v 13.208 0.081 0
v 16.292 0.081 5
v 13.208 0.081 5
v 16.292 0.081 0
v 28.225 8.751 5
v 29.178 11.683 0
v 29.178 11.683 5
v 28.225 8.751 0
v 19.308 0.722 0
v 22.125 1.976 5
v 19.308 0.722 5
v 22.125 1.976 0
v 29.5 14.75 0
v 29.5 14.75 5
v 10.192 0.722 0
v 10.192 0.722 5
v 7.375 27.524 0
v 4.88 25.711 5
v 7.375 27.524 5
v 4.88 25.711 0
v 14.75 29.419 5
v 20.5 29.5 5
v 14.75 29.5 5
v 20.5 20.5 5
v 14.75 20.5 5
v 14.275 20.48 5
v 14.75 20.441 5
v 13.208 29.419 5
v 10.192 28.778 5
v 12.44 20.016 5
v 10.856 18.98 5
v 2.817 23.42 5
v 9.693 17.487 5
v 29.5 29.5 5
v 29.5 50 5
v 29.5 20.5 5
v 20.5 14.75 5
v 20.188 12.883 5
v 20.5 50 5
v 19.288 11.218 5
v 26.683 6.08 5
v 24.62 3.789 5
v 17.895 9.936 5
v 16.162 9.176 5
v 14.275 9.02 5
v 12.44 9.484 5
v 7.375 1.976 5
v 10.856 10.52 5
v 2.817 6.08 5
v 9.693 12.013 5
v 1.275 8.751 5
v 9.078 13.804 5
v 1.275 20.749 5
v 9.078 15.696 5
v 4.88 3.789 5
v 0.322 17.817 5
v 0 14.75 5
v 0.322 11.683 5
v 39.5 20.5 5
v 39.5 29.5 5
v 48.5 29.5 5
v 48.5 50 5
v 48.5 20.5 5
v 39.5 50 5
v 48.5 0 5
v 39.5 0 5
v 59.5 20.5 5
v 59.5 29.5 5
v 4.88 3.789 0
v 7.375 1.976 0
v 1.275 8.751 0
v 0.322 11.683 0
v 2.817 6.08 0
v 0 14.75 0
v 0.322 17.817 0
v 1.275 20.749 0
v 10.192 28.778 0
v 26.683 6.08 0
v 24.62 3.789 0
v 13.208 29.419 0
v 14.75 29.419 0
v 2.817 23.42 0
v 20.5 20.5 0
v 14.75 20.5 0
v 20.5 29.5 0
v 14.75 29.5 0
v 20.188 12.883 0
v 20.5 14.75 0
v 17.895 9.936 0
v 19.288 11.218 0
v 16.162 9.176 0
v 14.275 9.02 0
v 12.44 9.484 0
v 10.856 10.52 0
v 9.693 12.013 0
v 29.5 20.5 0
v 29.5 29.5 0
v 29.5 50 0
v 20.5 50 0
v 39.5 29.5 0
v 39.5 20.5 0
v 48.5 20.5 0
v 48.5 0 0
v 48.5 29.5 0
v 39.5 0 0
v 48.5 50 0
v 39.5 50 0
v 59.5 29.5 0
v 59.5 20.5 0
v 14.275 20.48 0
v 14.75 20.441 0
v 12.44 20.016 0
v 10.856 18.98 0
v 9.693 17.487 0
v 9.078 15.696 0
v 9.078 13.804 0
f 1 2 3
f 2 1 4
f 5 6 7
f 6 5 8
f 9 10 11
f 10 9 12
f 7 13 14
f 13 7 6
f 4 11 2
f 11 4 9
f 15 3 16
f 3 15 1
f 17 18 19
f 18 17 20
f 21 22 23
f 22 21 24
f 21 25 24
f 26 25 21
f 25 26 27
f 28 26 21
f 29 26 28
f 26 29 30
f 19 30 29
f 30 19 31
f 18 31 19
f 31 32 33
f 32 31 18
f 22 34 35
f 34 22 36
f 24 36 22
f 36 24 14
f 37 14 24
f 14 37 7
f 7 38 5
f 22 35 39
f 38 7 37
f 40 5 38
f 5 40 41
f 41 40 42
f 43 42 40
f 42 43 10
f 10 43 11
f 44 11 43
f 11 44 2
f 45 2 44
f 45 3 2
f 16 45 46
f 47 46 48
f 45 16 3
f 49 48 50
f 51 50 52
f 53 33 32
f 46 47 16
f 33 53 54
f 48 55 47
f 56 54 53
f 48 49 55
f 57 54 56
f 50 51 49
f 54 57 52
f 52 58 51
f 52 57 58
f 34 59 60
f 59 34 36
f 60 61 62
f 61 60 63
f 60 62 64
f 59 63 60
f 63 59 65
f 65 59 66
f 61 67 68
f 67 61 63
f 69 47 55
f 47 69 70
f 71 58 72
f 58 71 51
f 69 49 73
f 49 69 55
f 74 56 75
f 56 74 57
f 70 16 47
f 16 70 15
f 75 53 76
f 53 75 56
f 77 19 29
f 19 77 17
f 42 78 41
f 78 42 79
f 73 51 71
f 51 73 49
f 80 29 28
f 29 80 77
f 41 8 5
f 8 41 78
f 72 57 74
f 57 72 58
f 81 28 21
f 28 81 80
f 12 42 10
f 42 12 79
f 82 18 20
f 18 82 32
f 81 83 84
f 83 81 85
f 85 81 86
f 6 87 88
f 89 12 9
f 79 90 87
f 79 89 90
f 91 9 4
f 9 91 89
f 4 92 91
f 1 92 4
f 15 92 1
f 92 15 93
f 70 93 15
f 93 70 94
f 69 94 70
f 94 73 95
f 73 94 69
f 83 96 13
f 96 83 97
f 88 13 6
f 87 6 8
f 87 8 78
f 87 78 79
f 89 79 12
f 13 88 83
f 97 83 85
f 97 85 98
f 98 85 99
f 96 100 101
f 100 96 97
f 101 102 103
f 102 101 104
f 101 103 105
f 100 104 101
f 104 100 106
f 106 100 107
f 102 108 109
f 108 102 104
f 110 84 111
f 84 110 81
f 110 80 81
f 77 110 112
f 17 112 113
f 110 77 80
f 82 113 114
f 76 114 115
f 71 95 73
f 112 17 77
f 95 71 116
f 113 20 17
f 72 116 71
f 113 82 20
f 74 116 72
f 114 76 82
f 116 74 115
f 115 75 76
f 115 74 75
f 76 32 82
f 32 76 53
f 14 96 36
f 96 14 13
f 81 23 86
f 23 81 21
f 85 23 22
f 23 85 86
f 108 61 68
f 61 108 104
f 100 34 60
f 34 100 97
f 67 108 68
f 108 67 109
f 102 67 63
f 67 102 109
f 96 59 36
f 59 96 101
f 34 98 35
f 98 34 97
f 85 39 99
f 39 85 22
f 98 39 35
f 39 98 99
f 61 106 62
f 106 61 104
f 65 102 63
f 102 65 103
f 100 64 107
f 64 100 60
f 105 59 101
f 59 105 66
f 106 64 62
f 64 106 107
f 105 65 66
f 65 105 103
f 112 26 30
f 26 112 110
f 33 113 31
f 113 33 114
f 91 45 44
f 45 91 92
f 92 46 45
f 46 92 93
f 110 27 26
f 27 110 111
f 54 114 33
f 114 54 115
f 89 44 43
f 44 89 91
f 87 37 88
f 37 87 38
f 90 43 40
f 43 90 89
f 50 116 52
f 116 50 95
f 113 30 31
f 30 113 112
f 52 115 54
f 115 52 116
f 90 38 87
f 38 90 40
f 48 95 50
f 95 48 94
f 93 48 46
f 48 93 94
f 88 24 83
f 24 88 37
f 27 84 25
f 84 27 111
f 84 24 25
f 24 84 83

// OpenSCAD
// JH logo

thickness = 5;
size = 50;  // total height

module logo_base(thickness, size, radius, line_thickness)
{
	arrow_pos = 0.6;

	//line_thickness = size * 0.15;
	hor_line_thickness = line_thickness;
	//radius = size * 0.25 + line_thickness / 2 / 2;
	
	translate([radius, radius, 0])
	cylinder(r=radius, h=thickness);

	translate([radius, radius, 0])
	cube([radius, radius, thickness]);

	// Horizontal line
	translate([2*radius - 1, 2*radius - line_thickness, 0])
	cube([size * arrow_pos + 1, line_thickness, thickness]);

	// triangle
	/*translate([2*radius + size*arrow_pos, size/2-1.5*line_thickness, 0])
	linear_extrude(height = thickness)
	polygon(points=[[0,0],[2*line_thickness, 1.5*line_thickness],[0,3*line_thickness]], paths=[[0,1,2]]);
	*/

	// Top part of J
	translate([2*radius - hor_line_thickness, 2*radius - 1, 0])
	cube([hor_line_thickness, size - (2*radius) + 1, thickness]);

	// Right part of H
	translate([2*radius + size*0.2, 0, 0])
	cube([hor_line_thickness, size, thickness]);
}

module logo(thickness, size)
{
	line_thickness = size * 0.18;
	radius = size * 0.25 + line_thickness / 2 / 2;
	inner_radius = radius - line_thickness;
	difference() {
		logo_base(thickness, size, radius, line_thickness);
		translate([radius, radius, -1])
			cylinder(r=inner_radius, h=thickness+2);
		translate([radius, radius, -1])
			cube([inner_radius, inner_radius, thickness+2]);
	}
}

minkowski()
{
	logo(thickness, size);
	//sphere(r=3);
}
